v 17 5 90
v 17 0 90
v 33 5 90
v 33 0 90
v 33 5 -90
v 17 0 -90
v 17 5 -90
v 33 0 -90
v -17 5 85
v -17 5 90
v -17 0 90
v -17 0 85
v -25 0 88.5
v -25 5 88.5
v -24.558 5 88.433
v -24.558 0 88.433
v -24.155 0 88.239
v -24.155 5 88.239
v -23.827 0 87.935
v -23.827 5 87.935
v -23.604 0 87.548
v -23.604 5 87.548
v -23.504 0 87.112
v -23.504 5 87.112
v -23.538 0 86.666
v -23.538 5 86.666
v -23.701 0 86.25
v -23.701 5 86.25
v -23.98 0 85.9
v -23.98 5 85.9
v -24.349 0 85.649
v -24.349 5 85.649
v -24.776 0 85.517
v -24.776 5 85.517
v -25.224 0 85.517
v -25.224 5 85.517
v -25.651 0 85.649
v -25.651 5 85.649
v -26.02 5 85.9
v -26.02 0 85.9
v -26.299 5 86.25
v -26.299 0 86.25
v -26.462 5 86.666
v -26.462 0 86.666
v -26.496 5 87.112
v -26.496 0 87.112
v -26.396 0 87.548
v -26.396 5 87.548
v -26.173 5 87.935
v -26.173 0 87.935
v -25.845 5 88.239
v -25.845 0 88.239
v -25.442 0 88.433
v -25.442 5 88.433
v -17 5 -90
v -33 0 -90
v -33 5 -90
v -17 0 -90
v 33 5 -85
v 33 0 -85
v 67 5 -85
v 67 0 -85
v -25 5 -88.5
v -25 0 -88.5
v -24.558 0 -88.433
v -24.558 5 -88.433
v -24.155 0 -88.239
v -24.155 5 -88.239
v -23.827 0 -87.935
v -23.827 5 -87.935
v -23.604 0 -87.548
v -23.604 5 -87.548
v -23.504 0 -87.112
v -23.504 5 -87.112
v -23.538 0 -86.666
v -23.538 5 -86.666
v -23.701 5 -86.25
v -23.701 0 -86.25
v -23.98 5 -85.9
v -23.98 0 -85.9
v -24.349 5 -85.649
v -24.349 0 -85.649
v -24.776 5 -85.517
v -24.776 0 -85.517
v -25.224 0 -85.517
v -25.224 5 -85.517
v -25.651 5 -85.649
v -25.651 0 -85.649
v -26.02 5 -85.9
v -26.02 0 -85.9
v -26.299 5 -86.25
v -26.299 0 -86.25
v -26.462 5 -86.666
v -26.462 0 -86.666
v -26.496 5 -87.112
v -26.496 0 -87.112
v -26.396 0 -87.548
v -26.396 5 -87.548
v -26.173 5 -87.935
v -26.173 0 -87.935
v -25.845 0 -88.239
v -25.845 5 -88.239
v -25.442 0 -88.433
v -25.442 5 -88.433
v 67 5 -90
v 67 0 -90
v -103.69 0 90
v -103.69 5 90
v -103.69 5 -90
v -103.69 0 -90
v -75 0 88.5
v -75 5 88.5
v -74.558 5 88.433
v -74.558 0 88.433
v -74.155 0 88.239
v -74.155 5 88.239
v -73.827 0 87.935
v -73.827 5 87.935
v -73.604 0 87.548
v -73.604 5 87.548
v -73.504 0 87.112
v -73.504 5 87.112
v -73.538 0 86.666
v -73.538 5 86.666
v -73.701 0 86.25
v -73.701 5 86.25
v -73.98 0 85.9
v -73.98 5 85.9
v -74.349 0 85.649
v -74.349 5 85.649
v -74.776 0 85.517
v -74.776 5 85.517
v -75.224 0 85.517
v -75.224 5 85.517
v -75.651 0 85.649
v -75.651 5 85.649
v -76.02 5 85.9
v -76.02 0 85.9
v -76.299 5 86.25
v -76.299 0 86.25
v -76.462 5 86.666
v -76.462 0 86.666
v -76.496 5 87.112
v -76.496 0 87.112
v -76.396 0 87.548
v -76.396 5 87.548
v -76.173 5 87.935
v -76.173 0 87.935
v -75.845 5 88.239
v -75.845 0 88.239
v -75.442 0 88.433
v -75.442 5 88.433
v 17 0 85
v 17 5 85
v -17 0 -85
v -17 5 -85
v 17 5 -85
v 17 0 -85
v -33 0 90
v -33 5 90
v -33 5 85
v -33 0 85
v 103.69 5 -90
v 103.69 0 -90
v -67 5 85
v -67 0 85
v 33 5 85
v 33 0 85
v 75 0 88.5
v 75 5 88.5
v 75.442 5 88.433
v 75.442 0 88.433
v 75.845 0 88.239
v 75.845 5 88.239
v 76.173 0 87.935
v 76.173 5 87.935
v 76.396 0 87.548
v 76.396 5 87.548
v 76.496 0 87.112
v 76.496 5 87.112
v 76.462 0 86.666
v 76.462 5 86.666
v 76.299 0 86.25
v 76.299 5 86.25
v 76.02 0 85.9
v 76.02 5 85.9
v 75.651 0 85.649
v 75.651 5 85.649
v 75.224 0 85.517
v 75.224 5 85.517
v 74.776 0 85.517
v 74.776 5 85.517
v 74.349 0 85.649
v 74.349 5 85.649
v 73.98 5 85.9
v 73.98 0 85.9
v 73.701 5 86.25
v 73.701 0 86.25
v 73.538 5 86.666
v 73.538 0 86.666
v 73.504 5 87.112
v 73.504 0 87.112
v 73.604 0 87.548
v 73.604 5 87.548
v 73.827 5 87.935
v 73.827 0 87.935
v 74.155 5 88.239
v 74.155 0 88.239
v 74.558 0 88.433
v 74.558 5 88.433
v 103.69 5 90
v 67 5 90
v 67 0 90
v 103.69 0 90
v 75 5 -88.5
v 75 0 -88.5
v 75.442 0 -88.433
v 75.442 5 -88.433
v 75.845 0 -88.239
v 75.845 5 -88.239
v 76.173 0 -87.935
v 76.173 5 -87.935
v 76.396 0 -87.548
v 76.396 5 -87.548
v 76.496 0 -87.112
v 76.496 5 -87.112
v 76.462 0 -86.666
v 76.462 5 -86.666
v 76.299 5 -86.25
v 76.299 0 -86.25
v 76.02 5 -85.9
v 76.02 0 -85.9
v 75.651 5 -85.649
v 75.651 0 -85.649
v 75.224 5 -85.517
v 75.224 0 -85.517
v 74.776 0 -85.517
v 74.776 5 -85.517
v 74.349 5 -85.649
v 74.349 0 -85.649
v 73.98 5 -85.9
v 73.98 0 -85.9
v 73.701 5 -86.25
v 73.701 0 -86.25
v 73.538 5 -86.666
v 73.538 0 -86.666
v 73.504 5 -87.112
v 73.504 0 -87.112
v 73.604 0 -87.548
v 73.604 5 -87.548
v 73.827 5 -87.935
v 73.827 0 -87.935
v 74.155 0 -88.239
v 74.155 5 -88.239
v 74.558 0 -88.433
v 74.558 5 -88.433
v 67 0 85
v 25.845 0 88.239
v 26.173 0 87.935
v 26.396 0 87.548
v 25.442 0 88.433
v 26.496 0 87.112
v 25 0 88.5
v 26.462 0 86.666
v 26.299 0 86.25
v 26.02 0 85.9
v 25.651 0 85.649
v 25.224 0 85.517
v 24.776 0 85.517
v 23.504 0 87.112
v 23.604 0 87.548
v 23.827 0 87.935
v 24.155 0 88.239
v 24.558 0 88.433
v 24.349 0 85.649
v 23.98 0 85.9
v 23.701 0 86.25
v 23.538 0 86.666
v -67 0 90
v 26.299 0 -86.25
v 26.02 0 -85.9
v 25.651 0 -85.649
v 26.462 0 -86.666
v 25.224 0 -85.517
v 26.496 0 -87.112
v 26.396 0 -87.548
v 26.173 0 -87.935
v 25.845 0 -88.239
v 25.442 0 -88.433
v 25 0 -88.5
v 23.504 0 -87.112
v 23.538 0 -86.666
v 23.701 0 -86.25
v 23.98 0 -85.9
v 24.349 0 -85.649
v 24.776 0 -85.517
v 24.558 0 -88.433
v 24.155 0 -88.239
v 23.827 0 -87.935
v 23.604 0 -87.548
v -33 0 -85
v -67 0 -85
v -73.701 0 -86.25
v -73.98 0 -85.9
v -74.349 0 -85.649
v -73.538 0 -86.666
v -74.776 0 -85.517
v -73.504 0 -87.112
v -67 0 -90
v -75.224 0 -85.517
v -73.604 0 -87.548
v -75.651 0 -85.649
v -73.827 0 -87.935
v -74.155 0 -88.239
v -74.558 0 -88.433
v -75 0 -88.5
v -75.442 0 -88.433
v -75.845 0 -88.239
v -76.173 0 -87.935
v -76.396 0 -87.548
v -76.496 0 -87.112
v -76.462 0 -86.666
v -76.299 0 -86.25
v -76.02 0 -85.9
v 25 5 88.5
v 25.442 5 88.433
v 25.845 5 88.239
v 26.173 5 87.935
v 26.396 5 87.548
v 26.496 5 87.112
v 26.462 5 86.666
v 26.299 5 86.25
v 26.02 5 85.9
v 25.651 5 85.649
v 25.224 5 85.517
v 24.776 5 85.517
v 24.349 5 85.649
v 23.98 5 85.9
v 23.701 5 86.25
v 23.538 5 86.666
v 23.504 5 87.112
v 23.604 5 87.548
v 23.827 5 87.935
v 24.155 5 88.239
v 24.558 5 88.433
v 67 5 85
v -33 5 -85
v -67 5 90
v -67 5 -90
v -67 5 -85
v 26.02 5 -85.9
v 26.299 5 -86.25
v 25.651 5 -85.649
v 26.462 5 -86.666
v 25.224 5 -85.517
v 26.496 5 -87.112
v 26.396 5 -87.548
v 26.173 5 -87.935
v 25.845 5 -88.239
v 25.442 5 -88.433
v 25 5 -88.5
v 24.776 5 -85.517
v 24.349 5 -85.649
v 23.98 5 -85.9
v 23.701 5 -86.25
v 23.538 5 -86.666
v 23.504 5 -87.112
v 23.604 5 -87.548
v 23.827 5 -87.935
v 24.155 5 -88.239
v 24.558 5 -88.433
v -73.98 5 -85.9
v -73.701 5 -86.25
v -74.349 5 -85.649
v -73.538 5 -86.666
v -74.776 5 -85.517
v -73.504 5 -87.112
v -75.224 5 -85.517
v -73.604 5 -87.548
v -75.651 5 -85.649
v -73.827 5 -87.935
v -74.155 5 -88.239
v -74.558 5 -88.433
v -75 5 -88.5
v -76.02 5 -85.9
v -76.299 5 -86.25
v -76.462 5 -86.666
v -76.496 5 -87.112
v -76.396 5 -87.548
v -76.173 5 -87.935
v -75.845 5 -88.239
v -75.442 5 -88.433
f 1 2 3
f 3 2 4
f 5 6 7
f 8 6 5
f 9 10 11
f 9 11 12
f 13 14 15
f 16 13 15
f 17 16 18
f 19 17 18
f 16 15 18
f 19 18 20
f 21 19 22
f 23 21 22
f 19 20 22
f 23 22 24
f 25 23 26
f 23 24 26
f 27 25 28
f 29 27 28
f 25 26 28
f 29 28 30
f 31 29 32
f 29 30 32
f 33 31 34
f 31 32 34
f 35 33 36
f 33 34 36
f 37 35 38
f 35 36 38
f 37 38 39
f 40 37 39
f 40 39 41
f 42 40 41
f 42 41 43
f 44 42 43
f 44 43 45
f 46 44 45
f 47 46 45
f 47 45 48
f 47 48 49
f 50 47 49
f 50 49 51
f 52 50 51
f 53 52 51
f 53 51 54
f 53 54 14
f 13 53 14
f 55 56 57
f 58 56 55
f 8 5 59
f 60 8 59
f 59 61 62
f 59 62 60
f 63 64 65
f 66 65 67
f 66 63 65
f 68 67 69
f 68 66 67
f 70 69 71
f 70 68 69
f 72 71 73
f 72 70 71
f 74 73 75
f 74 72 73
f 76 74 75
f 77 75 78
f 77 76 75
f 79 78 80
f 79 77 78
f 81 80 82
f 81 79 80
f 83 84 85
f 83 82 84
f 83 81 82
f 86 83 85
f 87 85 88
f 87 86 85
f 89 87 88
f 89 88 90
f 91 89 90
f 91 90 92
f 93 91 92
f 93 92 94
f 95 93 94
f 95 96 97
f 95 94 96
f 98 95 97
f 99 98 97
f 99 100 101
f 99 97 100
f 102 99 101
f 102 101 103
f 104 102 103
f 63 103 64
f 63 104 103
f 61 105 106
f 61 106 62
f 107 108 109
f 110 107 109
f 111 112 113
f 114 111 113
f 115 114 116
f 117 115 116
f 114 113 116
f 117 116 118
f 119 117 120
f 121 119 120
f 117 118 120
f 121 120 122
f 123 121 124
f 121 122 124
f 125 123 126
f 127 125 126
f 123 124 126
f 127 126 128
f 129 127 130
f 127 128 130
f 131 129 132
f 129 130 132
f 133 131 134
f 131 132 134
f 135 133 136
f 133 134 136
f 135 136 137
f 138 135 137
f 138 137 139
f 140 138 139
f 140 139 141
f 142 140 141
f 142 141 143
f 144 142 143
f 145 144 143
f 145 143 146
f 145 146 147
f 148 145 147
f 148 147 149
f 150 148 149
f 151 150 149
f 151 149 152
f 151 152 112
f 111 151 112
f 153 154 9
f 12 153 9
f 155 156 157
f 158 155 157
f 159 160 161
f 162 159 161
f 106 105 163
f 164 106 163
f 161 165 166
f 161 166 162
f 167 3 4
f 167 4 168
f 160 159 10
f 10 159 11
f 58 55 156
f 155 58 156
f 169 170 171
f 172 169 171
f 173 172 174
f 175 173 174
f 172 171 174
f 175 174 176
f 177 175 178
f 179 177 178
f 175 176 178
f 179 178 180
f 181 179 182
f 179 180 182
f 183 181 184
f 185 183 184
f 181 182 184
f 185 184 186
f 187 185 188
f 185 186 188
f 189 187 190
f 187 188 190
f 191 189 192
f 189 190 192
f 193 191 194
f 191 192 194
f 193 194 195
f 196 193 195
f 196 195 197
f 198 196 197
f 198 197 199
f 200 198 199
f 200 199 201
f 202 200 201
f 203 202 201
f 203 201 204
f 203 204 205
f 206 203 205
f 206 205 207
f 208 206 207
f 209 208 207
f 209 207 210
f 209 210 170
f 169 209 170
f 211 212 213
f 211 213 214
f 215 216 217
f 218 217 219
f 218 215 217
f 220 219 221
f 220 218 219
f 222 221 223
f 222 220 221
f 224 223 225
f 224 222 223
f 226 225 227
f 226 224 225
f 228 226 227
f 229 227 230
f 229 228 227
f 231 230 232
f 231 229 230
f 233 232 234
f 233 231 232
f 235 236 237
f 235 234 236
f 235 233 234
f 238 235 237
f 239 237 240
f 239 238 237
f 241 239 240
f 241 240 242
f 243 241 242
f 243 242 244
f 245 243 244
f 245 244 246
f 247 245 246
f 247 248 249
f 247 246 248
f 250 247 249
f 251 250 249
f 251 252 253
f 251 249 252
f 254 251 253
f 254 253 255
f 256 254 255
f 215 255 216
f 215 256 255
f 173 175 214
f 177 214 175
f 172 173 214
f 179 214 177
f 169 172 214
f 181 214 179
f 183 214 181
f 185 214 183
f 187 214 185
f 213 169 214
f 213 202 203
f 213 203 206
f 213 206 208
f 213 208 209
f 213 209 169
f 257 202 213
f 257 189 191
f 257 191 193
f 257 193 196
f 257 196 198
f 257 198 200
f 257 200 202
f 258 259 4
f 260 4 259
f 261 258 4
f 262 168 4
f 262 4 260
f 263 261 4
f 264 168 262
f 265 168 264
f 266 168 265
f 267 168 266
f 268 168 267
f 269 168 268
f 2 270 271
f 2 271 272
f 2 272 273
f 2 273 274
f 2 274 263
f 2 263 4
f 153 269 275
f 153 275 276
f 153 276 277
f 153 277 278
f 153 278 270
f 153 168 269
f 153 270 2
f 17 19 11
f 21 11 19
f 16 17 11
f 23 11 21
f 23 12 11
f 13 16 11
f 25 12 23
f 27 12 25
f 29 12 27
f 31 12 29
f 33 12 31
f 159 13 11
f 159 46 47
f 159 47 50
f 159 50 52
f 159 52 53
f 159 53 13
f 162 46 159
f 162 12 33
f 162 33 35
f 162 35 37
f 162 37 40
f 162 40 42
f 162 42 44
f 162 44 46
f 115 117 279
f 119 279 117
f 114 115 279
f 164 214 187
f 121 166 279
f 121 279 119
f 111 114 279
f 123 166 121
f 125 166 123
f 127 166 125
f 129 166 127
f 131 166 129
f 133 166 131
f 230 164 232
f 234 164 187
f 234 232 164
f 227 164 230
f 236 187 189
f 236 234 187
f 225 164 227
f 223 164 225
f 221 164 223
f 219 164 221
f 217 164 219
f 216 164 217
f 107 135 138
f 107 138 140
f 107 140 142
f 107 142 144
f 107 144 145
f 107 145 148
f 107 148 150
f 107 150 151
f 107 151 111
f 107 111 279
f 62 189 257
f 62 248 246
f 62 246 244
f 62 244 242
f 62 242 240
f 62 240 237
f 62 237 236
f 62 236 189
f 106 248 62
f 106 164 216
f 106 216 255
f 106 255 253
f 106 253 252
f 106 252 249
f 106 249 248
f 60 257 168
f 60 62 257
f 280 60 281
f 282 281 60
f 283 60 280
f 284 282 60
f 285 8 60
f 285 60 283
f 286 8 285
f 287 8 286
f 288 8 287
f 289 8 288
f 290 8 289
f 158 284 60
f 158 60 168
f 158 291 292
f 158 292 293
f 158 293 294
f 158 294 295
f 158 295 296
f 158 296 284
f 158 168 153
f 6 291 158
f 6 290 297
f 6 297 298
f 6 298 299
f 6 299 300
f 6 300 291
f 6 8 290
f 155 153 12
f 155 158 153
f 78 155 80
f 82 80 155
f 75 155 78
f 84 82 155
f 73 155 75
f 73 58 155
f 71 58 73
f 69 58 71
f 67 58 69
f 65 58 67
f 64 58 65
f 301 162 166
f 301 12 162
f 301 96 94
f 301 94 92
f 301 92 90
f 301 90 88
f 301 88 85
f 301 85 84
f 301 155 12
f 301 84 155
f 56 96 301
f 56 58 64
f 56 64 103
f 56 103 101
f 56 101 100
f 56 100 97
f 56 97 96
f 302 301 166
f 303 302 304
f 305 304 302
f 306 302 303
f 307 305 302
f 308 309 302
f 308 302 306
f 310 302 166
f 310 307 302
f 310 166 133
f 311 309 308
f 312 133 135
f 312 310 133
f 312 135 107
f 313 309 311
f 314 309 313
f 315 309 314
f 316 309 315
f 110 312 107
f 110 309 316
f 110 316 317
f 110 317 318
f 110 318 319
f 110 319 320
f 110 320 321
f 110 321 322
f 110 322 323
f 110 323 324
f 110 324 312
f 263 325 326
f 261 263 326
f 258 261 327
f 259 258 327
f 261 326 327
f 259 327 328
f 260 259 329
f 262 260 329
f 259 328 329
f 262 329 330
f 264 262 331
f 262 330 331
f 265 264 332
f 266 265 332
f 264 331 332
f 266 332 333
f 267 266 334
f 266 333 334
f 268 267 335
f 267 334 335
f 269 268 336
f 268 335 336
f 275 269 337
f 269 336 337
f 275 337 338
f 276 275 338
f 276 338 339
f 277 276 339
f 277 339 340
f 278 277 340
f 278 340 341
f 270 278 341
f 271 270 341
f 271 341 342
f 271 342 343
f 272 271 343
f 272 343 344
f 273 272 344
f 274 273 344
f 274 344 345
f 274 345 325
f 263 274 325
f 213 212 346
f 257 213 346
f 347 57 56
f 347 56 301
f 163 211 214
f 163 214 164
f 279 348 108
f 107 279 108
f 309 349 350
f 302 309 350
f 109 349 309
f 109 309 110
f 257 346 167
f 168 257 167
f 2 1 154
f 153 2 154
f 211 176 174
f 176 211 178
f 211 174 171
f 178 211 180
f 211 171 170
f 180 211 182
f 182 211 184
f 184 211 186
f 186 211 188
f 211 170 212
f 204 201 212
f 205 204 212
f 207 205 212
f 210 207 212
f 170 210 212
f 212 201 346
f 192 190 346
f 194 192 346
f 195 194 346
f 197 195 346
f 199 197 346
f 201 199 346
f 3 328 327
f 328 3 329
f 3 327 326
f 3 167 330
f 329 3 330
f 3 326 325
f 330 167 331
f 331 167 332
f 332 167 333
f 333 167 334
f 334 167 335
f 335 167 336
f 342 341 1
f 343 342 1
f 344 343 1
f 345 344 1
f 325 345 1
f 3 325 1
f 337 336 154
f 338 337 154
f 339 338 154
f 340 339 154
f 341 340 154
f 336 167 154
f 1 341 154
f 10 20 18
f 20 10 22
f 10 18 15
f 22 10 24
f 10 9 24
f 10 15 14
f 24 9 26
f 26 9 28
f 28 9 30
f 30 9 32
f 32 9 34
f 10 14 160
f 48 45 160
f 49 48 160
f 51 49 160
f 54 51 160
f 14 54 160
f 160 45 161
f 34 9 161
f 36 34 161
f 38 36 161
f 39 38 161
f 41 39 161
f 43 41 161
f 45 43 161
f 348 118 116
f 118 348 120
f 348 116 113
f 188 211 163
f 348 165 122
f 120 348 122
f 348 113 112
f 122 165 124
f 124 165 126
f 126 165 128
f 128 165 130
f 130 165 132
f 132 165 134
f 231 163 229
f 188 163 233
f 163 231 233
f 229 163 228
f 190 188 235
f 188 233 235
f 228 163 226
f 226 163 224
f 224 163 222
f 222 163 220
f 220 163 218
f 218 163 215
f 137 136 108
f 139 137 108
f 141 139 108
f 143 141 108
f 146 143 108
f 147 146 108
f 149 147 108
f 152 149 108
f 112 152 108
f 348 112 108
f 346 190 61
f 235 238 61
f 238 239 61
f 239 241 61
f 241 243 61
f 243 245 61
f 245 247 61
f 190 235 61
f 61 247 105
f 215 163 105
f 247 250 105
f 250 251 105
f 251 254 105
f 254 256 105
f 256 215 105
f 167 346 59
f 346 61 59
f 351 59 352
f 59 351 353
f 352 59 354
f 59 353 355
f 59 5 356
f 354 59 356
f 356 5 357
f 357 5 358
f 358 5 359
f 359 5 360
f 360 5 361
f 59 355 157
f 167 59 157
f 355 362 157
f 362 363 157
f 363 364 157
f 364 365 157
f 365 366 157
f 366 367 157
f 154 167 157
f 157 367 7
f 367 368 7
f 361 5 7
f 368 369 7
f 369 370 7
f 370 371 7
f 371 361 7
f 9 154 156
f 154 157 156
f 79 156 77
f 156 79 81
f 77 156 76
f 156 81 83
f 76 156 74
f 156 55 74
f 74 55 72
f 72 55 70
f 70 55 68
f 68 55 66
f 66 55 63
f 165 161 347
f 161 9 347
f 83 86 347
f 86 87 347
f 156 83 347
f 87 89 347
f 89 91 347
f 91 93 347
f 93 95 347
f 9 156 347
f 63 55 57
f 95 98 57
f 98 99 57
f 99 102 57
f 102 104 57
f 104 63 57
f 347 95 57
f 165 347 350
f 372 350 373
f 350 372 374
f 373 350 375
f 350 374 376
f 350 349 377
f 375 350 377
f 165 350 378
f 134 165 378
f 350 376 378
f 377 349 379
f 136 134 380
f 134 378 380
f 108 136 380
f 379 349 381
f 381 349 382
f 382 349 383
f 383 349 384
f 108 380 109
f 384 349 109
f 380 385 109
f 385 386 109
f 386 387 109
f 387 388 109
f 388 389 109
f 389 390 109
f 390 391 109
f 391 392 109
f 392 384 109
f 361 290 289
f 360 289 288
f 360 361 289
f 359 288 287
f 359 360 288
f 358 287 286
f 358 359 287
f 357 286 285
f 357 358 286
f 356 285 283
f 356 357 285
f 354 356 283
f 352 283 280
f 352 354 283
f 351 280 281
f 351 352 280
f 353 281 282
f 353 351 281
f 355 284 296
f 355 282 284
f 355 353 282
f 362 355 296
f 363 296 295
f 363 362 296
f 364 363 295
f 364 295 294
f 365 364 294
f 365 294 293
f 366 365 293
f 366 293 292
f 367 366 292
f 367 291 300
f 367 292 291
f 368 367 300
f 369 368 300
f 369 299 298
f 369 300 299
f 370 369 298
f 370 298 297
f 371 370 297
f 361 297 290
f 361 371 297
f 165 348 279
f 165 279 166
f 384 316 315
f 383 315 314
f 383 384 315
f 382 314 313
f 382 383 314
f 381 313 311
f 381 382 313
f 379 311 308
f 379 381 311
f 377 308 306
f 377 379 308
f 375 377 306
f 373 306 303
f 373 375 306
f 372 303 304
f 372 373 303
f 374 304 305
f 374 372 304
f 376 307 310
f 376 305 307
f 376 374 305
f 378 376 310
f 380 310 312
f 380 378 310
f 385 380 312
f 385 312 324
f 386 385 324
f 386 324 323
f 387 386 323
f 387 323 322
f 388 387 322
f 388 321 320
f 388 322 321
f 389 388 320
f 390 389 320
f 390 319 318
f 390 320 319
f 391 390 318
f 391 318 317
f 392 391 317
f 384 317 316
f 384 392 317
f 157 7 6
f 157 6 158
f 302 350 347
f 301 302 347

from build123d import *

# Parameters (mm, degrees)
CROQUIS1_W                  = 200
CROQUIS1_H                  = 180
SALIENTE_EXTRUIR1_DEPTH     = 5
CROQUIS4_W                  = 17
CROQUIS4_H                  = 5
CROQUIS4_W_2                = 34
CORTAR_EXTRUIR4_DEPTH       = 135.629120178
SIMETR_A3_COPY_1_SKETCH_W   = 17
SIMETR_A3_COPY_1_SKETCH_H   = 5
SIMETR_A3_COPY_1_SKETCH_W_2 = 34
SIMETR_A3_COPY_1_DEPTH      = 135.629120178
CROQUIS5_R                  = 1.5
CORTAR_EXTRUIR5_DEPTH       = 135.629120178
CROQUIS6_W                  = 17
CROQUIS6_H                  = 5
SALIENTE_EXTRUIR3_DEPTH     = 5
SIMETR_A6_COPY_1_SKETCH_W   = 17
SIMETR_A6_COPY_1_SKETCH_H   = 5
SIMETR_A6_COPY_1_DEPTH      = 5
CROQUIS9_W                  = 3.69
CROQUIS9_H                  = 180
SALIENTE_EXTRUIR7_DEPTH     = 5


with BuildPart() as part:
    # Croquis1 → Saliente-Extruir1 (new body)
    with BuildSketch(Plane(origin=(0, 0, 0), x_dir=(1, 0, 0), z_dir=(0, 1, 0))):
        Rectangle(CROQUIS1_W, CROQUIS1_H)
    extrude(amount=SALIENTE_EXTRUIR1_DEPTH)

    # Croquis4 → Cortar-Extruir4 (cut, through all)
    with BuildSketch(Plane(origin=(0, 5, 0), x_dir=(1, 0, 0), z_dir=(0, 1, 0))):
        with Locations((-91.5, -87.5)):
            Rectangle(CROQUIS4_W, CROQUIS4_H)
        with Locations((-50, -87.5)):
            Rectangle(CROQUIS4_W_2, CROQUIS4_H)
        with Locations((-8.5, -87.5)):
            Rectangle(CROQUIS4_W, CROQUIS4_H)
    cortar_extruir4 = extrude(amount=-CORTAR_EXTRUIR4_DEPTH, mode=Mode.SUBTRACT)

    # Simetría2: Cortar-Extruir4 across plane
    add(cortar_extruir4.mirror(Plane(origin=(0, 0, 0), x_dir=(0, 0, 1), z_dir=(1, 0, 0))), mode=Mode.SUBTRACT)

    # Simetría3: Cortar-Extruir4 across plane
    add(cortar_extruir4.mirror(Plane.XY), mode=Mode.SUBTRACT)

    # Simetría3 copy 1 sketch → Simetría3 copy 1 (cut, through all)
    with BuildSketch(Plane(origin=(0, 5, 0), x_dir=(-1, 0, 0), z_dir=(0, 1, 0))):
        with Locations((-91.5, -87.5)):
            Rectangle(SIMETR_A3_COPY_1_SKETCH_W, SIMETR_A3_COPY_1_SKETCH_H)
        with Locations((-50, -87.5)):
            Rectangle(SIMETR_A3_COPY_1_SKETCH_W_2, SIMETR_A3_COPY_1_SKETCH_H)
        with Locations((-8.5, -87.5)):
            Rectangle(SIMETR_A3_COPY_1_SKETCH_W, SIMETR_A3_COPY_1_SKETCH_H)
    extrude(amount=-SIMETR_A3_COPY_1_DEPTH, mode=Mode.SUBTRACT)

    # Croquis5 → Cortar-Extruir5 (cut, through all)
    with BuildSketch(Plane(origin=(0, 5, 0), x_dir=(1, 0, 0), z_dir=(0, 1, 0))):
        with Locations(Location((-75, -87, 0), (0, 0, 270))):
            Circle(CROQUIS5_R)
        with Locations(Location((-25, -87, 0), (0, 0, 270))):
            Circle(CROQUIS5_R)
        with Locations(Location((25, -87, 0), (0, 0, 270))):
            Circle(CROQUIS5_R)
        with Locations(Location((75, -87, 0), (0, 0, 270))):
            Circle(CROQUIS5_R)
    cortar_extruir5 = extrude(amount=-CORTAR_EXTRUIR5_DEPTH, mode=Mode.SUBTRACT)

    # Simetría4: Cortar-Extruir5 across plane
    add(cortar_extruir5.mirror(Plane.XY), mode=Mode.SUBTRACT)

    # Croquis6 → Saliente-Extruir3 (add, through all)
    with BuildSketch(Plane(origin=(0, 5, 0), x_dir=(1, 0, 0), z_dir=(0, 1, 0))):
        with Locations((91.5, 87.5)):
            Rectangle(CROQUIS6_W, CROQUIS6_H)
    saliente_extruir3 = extrude(amount=-SALIENTE_EXTRUIR3_DEPTH)

    # Simetría5: Saliente-Extruir3 across plane
    add(saliente_extruir3.mirror(Plane(origin=(0, 0, 0), x_dir=(0, 0, 1), z_dir=(1, 0, 0))))

    # Simetría6: Saliente-Extruir3 across plane
    add(saliente_extruir3.mirror(Plane.XY))

    # Simetría6 copy 1 sketch → Simetría6 copy 1 (add, through all)
    with BuildSketch(Plane(origin=(0, 5, 0), x_dir=(-1, 0, 0), z_dir=(0, 1, 0))):
        with Locations((91.5, 87.5)):
            Rectangle(SIMETR_A6_COPY_1_SKETCH_W, SIMETR_A6_COPY_1_SKETCH_H)
    extrude(amount=-SIMETR_A6_COPY_1_DEPTH)

    # Croquis9 → Saliente-Extruir7 (add)
    with BuildSketch(Plane(origin=(0, 5, 0), x_dir=(1, 0, 0), z_dir=(0, 1, 0))):
        with Locations((101.845, 0)):
            Rectangle(CROQUIS9_W, CROQUIS9_H)
    saliente_extruir7 = extrude(amount=-SALIENTE_EXTRUIR7_DEPTH)

    # Simetría7: Saliente-Extruir7 across plane
    add(saliente_extruir7.mirror(Plane(origin=(0, 0, 0), x_dir=(0, 0, 1), z_dir=(1, 0, 0))))


solid = part.part
